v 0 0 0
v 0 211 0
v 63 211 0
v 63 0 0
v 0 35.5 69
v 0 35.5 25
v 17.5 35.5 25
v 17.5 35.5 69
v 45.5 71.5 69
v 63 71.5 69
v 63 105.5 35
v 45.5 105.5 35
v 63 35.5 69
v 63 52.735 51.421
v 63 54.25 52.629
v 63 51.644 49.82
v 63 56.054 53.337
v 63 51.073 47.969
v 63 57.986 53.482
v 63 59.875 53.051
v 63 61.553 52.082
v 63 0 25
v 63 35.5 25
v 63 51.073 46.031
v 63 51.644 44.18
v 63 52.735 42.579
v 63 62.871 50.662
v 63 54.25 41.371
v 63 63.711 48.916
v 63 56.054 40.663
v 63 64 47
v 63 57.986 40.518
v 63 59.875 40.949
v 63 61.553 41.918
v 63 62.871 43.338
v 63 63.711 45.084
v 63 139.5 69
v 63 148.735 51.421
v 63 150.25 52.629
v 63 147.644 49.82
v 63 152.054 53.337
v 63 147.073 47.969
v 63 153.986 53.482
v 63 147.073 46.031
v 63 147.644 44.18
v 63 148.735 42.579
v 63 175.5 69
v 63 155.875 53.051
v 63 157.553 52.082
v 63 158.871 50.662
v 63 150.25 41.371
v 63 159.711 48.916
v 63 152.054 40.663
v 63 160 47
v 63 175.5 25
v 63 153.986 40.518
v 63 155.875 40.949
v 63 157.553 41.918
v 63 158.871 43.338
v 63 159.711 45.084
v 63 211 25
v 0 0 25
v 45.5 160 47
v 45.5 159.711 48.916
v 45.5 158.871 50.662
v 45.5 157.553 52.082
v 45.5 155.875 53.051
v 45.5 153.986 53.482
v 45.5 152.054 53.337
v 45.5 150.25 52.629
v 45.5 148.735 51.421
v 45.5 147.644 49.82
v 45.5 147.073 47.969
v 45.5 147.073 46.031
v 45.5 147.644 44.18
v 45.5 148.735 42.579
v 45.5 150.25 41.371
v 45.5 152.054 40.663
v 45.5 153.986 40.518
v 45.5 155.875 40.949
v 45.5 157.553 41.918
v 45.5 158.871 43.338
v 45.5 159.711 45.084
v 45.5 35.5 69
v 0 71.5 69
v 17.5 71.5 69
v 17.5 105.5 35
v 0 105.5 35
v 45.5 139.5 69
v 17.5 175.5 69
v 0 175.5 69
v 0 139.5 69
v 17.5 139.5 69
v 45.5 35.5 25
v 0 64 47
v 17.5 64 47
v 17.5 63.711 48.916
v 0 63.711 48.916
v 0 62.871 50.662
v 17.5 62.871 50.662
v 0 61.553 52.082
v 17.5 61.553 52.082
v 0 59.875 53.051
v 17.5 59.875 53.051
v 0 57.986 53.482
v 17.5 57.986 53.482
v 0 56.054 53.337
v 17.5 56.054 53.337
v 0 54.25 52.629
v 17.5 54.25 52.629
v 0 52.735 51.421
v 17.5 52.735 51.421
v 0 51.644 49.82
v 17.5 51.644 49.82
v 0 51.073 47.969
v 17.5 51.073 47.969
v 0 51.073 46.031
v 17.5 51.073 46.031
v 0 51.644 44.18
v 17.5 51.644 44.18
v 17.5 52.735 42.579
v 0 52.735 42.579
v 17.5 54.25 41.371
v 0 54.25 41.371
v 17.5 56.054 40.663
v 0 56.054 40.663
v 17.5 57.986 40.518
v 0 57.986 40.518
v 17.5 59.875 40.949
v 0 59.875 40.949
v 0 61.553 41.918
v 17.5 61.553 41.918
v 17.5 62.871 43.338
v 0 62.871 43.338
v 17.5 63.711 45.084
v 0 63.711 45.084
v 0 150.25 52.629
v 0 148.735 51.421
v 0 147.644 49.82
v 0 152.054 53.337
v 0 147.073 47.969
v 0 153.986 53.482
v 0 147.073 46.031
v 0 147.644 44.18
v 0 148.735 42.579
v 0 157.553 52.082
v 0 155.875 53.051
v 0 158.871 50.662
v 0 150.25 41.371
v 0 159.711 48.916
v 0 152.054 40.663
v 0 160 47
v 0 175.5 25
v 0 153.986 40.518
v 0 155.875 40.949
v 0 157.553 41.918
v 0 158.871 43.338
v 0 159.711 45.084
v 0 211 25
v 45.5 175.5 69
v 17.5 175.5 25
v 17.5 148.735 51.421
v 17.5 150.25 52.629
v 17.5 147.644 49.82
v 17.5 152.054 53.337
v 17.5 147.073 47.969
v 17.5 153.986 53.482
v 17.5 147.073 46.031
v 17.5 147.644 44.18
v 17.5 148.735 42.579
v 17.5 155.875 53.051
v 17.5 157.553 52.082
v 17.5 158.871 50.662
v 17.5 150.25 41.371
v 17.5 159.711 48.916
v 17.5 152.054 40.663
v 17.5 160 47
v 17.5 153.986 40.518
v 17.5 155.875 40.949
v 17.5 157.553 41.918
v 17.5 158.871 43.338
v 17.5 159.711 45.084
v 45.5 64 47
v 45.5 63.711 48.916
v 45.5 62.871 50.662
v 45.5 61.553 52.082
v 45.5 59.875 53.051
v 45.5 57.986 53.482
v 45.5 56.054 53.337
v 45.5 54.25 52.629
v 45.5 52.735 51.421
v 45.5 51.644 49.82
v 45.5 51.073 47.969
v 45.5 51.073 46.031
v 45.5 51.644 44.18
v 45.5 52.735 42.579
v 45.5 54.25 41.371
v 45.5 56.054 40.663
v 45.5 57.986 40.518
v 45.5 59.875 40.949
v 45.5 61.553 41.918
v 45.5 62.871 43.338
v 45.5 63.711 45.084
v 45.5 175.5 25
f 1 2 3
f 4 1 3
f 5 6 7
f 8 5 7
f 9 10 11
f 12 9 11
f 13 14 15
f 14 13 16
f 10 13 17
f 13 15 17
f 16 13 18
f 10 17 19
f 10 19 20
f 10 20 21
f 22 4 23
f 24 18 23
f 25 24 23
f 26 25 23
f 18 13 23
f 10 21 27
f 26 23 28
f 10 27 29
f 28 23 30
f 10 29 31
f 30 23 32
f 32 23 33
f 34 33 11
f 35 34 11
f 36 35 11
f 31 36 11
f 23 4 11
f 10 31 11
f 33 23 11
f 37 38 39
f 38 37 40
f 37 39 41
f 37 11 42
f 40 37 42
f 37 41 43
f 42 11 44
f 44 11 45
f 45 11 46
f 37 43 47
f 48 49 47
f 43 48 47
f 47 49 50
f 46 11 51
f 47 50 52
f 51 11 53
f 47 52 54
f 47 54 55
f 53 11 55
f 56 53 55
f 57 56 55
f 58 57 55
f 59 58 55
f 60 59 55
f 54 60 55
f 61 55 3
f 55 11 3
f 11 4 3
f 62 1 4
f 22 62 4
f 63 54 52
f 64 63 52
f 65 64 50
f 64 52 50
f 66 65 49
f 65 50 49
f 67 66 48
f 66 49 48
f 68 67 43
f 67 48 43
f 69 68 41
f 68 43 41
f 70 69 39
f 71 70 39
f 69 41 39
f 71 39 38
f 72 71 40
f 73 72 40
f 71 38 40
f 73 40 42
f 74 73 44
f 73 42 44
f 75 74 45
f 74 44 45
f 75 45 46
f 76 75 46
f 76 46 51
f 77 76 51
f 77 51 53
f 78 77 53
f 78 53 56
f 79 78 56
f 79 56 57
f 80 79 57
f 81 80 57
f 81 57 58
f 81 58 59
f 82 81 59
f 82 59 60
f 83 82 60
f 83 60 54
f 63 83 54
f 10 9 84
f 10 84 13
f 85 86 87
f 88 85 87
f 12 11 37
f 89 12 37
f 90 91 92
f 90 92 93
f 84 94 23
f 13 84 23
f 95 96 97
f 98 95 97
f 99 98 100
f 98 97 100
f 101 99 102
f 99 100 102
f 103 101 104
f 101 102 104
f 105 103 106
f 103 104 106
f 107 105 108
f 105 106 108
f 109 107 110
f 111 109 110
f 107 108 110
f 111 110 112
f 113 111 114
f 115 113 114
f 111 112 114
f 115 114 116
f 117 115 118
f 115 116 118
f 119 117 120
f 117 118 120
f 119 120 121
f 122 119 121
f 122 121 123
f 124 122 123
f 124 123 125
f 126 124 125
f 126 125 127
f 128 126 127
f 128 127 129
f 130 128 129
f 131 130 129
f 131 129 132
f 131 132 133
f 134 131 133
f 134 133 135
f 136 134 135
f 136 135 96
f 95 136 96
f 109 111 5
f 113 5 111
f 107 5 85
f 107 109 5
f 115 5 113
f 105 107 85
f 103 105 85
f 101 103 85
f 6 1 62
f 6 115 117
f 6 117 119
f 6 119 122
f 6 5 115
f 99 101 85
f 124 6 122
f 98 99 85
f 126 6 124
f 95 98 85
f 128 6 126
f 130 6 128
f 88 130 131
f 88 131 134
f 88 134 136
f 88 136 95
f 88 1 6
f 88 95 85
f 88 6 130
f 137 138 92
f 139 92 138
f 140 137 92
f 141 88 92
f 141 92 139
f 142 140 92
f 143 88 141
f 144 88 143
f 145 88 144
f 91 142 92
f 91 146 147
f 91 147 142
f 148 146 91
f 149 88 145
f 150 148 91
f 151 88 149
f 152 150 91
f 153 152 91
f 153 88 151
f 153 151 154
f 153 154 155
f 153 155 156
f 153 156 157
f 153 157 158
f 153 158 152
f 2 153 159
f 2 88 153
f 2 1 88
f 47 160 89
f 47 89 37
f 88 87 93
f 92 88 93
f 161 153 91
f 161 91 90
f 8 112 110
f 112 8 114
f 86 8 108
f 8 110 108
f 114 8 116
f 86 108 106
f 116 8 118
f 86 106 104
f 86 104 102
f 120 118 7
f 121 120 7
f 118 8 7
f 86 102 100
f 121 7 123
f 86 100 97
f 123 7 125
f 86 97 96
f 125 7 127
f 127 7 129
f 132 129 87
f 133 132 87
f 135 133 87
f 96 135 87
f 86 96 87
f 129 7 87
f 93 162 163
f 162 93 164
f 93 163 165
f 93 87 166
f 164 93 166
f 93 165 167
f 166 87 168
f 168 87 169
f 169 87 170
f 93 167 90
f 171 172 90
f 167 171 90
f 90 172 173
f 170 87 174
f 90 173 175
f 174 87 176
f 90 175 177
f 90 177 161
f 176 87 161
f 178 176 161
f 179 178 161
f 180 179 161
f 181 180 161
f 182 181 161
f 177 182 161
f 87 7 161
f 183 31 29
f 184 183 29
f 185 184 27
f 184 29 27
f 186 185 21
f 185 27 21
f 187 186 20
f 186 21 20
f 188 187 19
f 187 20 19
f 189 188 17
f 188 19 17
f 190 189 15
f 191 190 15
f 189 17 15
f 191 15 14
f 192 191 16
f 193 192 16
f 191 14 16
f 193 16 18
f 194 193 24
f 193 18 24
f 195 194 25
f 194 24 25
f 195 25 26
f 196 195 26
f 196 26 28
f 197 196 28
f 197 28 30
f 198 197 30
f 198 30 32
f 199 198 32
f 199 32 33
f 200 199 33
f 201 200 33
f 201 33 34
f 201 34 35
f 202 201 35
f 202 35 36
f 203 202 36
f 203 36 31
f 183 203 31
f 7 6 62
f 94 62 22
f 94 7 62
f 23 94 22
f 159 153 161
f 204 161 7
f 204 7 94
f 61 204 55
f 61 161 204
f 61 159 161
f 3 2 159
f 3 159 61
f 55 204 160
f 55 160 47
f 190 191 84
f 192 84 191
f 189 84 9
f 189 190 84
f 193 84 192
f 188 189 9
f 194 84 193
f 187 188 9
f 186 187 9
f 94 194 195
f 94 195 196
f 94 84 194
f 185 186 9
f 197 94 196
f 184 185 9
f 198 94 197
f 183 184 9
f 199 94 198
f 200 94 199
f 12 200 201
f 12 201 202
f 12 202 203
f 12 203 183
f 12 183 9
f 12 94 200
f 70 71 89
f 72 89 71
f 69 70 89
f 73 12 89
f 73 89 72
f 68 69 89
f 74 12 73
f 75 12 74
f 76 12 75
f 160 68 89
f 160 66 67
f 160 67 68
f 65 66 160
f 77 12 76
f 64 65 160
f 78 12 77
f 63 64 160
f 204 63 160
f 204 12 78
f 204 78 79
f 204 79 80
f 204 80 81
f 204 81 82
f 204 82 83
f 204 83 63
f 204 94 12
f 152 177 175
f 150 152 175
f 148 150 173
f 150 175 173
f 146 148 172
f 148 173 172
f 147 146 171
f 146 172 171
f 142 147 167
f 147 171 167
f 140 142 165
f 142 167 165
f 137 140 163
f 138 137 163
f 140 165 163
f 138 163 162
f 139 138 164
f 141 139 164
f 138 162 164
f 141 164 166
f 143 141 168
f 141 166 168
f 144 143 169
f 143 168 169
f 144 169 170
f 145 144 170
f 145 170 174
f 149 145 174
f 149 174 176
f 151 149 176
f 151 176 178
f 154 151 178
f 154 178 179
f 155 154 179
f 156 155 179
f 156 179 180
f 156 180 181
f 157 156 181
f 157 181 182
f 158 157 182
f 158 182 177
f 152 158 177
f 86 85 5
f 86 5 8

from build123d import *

# Parameters (mm, degrees)
SKETCH_W        = 63
SKETCH_H        = 211
PAD_DEPTH       = 25
SKETCH001_W     = 17.5
SKETCH001_H     = 140
PAD001_DEPTH    = 44
POCKET_DEPTH    = 63
SKETCH003_R     = 6.5
POCKET001_DEPTH = 63


with BuildPart() as part:
    # Sketch → Pad (new body)
    with BuildSketch(Plane.XY):
        with Locations((31.5, 105.5)):
            Rectangle(SKETCH_W, SKETCH_H)
    extrude(amount=PAD_DEPTH)

    # Sketch001 (on Face6 of Pad) → Pad001 (join)
    with BuildSketch(Plane.XY.offset(25)):
        with Locations((8.75, 105.5)):
            Rectangle(SKETCH001_W, SKETCH001_H)
        with Locations((54.25, 105.5)):
            Rectangle(SKETCH001_W, SKETCH001_H)
    extrude(amount=PAD001_DEPTH)

    # Sketch002 (on Face8 of Pad001) → Pocket (cut)
    with BuildSketch(Plane.YZ.offset(63)):
        Polygon((71.5, 69), (105.5, 35), (139.5, 69), align=None)
    extrude(amount=-POCKET_DEPTH, mode=Mode.SUBTRACT)

    # Sketch003 (on Face8 of Pocket) → Pocket001 (cut)
    with BuildSketch(Plane.YZ.offset(63)):
        with Locations((57.5, 47)):
            Circle(SKETCH003_R)
        with Locations((153.5, 47)):
            Circle(SKETCH003_R)
    extrude(amount=-POCKET001_DEPTH, mode=Mode.SUBTRACT)


solid = part.part
